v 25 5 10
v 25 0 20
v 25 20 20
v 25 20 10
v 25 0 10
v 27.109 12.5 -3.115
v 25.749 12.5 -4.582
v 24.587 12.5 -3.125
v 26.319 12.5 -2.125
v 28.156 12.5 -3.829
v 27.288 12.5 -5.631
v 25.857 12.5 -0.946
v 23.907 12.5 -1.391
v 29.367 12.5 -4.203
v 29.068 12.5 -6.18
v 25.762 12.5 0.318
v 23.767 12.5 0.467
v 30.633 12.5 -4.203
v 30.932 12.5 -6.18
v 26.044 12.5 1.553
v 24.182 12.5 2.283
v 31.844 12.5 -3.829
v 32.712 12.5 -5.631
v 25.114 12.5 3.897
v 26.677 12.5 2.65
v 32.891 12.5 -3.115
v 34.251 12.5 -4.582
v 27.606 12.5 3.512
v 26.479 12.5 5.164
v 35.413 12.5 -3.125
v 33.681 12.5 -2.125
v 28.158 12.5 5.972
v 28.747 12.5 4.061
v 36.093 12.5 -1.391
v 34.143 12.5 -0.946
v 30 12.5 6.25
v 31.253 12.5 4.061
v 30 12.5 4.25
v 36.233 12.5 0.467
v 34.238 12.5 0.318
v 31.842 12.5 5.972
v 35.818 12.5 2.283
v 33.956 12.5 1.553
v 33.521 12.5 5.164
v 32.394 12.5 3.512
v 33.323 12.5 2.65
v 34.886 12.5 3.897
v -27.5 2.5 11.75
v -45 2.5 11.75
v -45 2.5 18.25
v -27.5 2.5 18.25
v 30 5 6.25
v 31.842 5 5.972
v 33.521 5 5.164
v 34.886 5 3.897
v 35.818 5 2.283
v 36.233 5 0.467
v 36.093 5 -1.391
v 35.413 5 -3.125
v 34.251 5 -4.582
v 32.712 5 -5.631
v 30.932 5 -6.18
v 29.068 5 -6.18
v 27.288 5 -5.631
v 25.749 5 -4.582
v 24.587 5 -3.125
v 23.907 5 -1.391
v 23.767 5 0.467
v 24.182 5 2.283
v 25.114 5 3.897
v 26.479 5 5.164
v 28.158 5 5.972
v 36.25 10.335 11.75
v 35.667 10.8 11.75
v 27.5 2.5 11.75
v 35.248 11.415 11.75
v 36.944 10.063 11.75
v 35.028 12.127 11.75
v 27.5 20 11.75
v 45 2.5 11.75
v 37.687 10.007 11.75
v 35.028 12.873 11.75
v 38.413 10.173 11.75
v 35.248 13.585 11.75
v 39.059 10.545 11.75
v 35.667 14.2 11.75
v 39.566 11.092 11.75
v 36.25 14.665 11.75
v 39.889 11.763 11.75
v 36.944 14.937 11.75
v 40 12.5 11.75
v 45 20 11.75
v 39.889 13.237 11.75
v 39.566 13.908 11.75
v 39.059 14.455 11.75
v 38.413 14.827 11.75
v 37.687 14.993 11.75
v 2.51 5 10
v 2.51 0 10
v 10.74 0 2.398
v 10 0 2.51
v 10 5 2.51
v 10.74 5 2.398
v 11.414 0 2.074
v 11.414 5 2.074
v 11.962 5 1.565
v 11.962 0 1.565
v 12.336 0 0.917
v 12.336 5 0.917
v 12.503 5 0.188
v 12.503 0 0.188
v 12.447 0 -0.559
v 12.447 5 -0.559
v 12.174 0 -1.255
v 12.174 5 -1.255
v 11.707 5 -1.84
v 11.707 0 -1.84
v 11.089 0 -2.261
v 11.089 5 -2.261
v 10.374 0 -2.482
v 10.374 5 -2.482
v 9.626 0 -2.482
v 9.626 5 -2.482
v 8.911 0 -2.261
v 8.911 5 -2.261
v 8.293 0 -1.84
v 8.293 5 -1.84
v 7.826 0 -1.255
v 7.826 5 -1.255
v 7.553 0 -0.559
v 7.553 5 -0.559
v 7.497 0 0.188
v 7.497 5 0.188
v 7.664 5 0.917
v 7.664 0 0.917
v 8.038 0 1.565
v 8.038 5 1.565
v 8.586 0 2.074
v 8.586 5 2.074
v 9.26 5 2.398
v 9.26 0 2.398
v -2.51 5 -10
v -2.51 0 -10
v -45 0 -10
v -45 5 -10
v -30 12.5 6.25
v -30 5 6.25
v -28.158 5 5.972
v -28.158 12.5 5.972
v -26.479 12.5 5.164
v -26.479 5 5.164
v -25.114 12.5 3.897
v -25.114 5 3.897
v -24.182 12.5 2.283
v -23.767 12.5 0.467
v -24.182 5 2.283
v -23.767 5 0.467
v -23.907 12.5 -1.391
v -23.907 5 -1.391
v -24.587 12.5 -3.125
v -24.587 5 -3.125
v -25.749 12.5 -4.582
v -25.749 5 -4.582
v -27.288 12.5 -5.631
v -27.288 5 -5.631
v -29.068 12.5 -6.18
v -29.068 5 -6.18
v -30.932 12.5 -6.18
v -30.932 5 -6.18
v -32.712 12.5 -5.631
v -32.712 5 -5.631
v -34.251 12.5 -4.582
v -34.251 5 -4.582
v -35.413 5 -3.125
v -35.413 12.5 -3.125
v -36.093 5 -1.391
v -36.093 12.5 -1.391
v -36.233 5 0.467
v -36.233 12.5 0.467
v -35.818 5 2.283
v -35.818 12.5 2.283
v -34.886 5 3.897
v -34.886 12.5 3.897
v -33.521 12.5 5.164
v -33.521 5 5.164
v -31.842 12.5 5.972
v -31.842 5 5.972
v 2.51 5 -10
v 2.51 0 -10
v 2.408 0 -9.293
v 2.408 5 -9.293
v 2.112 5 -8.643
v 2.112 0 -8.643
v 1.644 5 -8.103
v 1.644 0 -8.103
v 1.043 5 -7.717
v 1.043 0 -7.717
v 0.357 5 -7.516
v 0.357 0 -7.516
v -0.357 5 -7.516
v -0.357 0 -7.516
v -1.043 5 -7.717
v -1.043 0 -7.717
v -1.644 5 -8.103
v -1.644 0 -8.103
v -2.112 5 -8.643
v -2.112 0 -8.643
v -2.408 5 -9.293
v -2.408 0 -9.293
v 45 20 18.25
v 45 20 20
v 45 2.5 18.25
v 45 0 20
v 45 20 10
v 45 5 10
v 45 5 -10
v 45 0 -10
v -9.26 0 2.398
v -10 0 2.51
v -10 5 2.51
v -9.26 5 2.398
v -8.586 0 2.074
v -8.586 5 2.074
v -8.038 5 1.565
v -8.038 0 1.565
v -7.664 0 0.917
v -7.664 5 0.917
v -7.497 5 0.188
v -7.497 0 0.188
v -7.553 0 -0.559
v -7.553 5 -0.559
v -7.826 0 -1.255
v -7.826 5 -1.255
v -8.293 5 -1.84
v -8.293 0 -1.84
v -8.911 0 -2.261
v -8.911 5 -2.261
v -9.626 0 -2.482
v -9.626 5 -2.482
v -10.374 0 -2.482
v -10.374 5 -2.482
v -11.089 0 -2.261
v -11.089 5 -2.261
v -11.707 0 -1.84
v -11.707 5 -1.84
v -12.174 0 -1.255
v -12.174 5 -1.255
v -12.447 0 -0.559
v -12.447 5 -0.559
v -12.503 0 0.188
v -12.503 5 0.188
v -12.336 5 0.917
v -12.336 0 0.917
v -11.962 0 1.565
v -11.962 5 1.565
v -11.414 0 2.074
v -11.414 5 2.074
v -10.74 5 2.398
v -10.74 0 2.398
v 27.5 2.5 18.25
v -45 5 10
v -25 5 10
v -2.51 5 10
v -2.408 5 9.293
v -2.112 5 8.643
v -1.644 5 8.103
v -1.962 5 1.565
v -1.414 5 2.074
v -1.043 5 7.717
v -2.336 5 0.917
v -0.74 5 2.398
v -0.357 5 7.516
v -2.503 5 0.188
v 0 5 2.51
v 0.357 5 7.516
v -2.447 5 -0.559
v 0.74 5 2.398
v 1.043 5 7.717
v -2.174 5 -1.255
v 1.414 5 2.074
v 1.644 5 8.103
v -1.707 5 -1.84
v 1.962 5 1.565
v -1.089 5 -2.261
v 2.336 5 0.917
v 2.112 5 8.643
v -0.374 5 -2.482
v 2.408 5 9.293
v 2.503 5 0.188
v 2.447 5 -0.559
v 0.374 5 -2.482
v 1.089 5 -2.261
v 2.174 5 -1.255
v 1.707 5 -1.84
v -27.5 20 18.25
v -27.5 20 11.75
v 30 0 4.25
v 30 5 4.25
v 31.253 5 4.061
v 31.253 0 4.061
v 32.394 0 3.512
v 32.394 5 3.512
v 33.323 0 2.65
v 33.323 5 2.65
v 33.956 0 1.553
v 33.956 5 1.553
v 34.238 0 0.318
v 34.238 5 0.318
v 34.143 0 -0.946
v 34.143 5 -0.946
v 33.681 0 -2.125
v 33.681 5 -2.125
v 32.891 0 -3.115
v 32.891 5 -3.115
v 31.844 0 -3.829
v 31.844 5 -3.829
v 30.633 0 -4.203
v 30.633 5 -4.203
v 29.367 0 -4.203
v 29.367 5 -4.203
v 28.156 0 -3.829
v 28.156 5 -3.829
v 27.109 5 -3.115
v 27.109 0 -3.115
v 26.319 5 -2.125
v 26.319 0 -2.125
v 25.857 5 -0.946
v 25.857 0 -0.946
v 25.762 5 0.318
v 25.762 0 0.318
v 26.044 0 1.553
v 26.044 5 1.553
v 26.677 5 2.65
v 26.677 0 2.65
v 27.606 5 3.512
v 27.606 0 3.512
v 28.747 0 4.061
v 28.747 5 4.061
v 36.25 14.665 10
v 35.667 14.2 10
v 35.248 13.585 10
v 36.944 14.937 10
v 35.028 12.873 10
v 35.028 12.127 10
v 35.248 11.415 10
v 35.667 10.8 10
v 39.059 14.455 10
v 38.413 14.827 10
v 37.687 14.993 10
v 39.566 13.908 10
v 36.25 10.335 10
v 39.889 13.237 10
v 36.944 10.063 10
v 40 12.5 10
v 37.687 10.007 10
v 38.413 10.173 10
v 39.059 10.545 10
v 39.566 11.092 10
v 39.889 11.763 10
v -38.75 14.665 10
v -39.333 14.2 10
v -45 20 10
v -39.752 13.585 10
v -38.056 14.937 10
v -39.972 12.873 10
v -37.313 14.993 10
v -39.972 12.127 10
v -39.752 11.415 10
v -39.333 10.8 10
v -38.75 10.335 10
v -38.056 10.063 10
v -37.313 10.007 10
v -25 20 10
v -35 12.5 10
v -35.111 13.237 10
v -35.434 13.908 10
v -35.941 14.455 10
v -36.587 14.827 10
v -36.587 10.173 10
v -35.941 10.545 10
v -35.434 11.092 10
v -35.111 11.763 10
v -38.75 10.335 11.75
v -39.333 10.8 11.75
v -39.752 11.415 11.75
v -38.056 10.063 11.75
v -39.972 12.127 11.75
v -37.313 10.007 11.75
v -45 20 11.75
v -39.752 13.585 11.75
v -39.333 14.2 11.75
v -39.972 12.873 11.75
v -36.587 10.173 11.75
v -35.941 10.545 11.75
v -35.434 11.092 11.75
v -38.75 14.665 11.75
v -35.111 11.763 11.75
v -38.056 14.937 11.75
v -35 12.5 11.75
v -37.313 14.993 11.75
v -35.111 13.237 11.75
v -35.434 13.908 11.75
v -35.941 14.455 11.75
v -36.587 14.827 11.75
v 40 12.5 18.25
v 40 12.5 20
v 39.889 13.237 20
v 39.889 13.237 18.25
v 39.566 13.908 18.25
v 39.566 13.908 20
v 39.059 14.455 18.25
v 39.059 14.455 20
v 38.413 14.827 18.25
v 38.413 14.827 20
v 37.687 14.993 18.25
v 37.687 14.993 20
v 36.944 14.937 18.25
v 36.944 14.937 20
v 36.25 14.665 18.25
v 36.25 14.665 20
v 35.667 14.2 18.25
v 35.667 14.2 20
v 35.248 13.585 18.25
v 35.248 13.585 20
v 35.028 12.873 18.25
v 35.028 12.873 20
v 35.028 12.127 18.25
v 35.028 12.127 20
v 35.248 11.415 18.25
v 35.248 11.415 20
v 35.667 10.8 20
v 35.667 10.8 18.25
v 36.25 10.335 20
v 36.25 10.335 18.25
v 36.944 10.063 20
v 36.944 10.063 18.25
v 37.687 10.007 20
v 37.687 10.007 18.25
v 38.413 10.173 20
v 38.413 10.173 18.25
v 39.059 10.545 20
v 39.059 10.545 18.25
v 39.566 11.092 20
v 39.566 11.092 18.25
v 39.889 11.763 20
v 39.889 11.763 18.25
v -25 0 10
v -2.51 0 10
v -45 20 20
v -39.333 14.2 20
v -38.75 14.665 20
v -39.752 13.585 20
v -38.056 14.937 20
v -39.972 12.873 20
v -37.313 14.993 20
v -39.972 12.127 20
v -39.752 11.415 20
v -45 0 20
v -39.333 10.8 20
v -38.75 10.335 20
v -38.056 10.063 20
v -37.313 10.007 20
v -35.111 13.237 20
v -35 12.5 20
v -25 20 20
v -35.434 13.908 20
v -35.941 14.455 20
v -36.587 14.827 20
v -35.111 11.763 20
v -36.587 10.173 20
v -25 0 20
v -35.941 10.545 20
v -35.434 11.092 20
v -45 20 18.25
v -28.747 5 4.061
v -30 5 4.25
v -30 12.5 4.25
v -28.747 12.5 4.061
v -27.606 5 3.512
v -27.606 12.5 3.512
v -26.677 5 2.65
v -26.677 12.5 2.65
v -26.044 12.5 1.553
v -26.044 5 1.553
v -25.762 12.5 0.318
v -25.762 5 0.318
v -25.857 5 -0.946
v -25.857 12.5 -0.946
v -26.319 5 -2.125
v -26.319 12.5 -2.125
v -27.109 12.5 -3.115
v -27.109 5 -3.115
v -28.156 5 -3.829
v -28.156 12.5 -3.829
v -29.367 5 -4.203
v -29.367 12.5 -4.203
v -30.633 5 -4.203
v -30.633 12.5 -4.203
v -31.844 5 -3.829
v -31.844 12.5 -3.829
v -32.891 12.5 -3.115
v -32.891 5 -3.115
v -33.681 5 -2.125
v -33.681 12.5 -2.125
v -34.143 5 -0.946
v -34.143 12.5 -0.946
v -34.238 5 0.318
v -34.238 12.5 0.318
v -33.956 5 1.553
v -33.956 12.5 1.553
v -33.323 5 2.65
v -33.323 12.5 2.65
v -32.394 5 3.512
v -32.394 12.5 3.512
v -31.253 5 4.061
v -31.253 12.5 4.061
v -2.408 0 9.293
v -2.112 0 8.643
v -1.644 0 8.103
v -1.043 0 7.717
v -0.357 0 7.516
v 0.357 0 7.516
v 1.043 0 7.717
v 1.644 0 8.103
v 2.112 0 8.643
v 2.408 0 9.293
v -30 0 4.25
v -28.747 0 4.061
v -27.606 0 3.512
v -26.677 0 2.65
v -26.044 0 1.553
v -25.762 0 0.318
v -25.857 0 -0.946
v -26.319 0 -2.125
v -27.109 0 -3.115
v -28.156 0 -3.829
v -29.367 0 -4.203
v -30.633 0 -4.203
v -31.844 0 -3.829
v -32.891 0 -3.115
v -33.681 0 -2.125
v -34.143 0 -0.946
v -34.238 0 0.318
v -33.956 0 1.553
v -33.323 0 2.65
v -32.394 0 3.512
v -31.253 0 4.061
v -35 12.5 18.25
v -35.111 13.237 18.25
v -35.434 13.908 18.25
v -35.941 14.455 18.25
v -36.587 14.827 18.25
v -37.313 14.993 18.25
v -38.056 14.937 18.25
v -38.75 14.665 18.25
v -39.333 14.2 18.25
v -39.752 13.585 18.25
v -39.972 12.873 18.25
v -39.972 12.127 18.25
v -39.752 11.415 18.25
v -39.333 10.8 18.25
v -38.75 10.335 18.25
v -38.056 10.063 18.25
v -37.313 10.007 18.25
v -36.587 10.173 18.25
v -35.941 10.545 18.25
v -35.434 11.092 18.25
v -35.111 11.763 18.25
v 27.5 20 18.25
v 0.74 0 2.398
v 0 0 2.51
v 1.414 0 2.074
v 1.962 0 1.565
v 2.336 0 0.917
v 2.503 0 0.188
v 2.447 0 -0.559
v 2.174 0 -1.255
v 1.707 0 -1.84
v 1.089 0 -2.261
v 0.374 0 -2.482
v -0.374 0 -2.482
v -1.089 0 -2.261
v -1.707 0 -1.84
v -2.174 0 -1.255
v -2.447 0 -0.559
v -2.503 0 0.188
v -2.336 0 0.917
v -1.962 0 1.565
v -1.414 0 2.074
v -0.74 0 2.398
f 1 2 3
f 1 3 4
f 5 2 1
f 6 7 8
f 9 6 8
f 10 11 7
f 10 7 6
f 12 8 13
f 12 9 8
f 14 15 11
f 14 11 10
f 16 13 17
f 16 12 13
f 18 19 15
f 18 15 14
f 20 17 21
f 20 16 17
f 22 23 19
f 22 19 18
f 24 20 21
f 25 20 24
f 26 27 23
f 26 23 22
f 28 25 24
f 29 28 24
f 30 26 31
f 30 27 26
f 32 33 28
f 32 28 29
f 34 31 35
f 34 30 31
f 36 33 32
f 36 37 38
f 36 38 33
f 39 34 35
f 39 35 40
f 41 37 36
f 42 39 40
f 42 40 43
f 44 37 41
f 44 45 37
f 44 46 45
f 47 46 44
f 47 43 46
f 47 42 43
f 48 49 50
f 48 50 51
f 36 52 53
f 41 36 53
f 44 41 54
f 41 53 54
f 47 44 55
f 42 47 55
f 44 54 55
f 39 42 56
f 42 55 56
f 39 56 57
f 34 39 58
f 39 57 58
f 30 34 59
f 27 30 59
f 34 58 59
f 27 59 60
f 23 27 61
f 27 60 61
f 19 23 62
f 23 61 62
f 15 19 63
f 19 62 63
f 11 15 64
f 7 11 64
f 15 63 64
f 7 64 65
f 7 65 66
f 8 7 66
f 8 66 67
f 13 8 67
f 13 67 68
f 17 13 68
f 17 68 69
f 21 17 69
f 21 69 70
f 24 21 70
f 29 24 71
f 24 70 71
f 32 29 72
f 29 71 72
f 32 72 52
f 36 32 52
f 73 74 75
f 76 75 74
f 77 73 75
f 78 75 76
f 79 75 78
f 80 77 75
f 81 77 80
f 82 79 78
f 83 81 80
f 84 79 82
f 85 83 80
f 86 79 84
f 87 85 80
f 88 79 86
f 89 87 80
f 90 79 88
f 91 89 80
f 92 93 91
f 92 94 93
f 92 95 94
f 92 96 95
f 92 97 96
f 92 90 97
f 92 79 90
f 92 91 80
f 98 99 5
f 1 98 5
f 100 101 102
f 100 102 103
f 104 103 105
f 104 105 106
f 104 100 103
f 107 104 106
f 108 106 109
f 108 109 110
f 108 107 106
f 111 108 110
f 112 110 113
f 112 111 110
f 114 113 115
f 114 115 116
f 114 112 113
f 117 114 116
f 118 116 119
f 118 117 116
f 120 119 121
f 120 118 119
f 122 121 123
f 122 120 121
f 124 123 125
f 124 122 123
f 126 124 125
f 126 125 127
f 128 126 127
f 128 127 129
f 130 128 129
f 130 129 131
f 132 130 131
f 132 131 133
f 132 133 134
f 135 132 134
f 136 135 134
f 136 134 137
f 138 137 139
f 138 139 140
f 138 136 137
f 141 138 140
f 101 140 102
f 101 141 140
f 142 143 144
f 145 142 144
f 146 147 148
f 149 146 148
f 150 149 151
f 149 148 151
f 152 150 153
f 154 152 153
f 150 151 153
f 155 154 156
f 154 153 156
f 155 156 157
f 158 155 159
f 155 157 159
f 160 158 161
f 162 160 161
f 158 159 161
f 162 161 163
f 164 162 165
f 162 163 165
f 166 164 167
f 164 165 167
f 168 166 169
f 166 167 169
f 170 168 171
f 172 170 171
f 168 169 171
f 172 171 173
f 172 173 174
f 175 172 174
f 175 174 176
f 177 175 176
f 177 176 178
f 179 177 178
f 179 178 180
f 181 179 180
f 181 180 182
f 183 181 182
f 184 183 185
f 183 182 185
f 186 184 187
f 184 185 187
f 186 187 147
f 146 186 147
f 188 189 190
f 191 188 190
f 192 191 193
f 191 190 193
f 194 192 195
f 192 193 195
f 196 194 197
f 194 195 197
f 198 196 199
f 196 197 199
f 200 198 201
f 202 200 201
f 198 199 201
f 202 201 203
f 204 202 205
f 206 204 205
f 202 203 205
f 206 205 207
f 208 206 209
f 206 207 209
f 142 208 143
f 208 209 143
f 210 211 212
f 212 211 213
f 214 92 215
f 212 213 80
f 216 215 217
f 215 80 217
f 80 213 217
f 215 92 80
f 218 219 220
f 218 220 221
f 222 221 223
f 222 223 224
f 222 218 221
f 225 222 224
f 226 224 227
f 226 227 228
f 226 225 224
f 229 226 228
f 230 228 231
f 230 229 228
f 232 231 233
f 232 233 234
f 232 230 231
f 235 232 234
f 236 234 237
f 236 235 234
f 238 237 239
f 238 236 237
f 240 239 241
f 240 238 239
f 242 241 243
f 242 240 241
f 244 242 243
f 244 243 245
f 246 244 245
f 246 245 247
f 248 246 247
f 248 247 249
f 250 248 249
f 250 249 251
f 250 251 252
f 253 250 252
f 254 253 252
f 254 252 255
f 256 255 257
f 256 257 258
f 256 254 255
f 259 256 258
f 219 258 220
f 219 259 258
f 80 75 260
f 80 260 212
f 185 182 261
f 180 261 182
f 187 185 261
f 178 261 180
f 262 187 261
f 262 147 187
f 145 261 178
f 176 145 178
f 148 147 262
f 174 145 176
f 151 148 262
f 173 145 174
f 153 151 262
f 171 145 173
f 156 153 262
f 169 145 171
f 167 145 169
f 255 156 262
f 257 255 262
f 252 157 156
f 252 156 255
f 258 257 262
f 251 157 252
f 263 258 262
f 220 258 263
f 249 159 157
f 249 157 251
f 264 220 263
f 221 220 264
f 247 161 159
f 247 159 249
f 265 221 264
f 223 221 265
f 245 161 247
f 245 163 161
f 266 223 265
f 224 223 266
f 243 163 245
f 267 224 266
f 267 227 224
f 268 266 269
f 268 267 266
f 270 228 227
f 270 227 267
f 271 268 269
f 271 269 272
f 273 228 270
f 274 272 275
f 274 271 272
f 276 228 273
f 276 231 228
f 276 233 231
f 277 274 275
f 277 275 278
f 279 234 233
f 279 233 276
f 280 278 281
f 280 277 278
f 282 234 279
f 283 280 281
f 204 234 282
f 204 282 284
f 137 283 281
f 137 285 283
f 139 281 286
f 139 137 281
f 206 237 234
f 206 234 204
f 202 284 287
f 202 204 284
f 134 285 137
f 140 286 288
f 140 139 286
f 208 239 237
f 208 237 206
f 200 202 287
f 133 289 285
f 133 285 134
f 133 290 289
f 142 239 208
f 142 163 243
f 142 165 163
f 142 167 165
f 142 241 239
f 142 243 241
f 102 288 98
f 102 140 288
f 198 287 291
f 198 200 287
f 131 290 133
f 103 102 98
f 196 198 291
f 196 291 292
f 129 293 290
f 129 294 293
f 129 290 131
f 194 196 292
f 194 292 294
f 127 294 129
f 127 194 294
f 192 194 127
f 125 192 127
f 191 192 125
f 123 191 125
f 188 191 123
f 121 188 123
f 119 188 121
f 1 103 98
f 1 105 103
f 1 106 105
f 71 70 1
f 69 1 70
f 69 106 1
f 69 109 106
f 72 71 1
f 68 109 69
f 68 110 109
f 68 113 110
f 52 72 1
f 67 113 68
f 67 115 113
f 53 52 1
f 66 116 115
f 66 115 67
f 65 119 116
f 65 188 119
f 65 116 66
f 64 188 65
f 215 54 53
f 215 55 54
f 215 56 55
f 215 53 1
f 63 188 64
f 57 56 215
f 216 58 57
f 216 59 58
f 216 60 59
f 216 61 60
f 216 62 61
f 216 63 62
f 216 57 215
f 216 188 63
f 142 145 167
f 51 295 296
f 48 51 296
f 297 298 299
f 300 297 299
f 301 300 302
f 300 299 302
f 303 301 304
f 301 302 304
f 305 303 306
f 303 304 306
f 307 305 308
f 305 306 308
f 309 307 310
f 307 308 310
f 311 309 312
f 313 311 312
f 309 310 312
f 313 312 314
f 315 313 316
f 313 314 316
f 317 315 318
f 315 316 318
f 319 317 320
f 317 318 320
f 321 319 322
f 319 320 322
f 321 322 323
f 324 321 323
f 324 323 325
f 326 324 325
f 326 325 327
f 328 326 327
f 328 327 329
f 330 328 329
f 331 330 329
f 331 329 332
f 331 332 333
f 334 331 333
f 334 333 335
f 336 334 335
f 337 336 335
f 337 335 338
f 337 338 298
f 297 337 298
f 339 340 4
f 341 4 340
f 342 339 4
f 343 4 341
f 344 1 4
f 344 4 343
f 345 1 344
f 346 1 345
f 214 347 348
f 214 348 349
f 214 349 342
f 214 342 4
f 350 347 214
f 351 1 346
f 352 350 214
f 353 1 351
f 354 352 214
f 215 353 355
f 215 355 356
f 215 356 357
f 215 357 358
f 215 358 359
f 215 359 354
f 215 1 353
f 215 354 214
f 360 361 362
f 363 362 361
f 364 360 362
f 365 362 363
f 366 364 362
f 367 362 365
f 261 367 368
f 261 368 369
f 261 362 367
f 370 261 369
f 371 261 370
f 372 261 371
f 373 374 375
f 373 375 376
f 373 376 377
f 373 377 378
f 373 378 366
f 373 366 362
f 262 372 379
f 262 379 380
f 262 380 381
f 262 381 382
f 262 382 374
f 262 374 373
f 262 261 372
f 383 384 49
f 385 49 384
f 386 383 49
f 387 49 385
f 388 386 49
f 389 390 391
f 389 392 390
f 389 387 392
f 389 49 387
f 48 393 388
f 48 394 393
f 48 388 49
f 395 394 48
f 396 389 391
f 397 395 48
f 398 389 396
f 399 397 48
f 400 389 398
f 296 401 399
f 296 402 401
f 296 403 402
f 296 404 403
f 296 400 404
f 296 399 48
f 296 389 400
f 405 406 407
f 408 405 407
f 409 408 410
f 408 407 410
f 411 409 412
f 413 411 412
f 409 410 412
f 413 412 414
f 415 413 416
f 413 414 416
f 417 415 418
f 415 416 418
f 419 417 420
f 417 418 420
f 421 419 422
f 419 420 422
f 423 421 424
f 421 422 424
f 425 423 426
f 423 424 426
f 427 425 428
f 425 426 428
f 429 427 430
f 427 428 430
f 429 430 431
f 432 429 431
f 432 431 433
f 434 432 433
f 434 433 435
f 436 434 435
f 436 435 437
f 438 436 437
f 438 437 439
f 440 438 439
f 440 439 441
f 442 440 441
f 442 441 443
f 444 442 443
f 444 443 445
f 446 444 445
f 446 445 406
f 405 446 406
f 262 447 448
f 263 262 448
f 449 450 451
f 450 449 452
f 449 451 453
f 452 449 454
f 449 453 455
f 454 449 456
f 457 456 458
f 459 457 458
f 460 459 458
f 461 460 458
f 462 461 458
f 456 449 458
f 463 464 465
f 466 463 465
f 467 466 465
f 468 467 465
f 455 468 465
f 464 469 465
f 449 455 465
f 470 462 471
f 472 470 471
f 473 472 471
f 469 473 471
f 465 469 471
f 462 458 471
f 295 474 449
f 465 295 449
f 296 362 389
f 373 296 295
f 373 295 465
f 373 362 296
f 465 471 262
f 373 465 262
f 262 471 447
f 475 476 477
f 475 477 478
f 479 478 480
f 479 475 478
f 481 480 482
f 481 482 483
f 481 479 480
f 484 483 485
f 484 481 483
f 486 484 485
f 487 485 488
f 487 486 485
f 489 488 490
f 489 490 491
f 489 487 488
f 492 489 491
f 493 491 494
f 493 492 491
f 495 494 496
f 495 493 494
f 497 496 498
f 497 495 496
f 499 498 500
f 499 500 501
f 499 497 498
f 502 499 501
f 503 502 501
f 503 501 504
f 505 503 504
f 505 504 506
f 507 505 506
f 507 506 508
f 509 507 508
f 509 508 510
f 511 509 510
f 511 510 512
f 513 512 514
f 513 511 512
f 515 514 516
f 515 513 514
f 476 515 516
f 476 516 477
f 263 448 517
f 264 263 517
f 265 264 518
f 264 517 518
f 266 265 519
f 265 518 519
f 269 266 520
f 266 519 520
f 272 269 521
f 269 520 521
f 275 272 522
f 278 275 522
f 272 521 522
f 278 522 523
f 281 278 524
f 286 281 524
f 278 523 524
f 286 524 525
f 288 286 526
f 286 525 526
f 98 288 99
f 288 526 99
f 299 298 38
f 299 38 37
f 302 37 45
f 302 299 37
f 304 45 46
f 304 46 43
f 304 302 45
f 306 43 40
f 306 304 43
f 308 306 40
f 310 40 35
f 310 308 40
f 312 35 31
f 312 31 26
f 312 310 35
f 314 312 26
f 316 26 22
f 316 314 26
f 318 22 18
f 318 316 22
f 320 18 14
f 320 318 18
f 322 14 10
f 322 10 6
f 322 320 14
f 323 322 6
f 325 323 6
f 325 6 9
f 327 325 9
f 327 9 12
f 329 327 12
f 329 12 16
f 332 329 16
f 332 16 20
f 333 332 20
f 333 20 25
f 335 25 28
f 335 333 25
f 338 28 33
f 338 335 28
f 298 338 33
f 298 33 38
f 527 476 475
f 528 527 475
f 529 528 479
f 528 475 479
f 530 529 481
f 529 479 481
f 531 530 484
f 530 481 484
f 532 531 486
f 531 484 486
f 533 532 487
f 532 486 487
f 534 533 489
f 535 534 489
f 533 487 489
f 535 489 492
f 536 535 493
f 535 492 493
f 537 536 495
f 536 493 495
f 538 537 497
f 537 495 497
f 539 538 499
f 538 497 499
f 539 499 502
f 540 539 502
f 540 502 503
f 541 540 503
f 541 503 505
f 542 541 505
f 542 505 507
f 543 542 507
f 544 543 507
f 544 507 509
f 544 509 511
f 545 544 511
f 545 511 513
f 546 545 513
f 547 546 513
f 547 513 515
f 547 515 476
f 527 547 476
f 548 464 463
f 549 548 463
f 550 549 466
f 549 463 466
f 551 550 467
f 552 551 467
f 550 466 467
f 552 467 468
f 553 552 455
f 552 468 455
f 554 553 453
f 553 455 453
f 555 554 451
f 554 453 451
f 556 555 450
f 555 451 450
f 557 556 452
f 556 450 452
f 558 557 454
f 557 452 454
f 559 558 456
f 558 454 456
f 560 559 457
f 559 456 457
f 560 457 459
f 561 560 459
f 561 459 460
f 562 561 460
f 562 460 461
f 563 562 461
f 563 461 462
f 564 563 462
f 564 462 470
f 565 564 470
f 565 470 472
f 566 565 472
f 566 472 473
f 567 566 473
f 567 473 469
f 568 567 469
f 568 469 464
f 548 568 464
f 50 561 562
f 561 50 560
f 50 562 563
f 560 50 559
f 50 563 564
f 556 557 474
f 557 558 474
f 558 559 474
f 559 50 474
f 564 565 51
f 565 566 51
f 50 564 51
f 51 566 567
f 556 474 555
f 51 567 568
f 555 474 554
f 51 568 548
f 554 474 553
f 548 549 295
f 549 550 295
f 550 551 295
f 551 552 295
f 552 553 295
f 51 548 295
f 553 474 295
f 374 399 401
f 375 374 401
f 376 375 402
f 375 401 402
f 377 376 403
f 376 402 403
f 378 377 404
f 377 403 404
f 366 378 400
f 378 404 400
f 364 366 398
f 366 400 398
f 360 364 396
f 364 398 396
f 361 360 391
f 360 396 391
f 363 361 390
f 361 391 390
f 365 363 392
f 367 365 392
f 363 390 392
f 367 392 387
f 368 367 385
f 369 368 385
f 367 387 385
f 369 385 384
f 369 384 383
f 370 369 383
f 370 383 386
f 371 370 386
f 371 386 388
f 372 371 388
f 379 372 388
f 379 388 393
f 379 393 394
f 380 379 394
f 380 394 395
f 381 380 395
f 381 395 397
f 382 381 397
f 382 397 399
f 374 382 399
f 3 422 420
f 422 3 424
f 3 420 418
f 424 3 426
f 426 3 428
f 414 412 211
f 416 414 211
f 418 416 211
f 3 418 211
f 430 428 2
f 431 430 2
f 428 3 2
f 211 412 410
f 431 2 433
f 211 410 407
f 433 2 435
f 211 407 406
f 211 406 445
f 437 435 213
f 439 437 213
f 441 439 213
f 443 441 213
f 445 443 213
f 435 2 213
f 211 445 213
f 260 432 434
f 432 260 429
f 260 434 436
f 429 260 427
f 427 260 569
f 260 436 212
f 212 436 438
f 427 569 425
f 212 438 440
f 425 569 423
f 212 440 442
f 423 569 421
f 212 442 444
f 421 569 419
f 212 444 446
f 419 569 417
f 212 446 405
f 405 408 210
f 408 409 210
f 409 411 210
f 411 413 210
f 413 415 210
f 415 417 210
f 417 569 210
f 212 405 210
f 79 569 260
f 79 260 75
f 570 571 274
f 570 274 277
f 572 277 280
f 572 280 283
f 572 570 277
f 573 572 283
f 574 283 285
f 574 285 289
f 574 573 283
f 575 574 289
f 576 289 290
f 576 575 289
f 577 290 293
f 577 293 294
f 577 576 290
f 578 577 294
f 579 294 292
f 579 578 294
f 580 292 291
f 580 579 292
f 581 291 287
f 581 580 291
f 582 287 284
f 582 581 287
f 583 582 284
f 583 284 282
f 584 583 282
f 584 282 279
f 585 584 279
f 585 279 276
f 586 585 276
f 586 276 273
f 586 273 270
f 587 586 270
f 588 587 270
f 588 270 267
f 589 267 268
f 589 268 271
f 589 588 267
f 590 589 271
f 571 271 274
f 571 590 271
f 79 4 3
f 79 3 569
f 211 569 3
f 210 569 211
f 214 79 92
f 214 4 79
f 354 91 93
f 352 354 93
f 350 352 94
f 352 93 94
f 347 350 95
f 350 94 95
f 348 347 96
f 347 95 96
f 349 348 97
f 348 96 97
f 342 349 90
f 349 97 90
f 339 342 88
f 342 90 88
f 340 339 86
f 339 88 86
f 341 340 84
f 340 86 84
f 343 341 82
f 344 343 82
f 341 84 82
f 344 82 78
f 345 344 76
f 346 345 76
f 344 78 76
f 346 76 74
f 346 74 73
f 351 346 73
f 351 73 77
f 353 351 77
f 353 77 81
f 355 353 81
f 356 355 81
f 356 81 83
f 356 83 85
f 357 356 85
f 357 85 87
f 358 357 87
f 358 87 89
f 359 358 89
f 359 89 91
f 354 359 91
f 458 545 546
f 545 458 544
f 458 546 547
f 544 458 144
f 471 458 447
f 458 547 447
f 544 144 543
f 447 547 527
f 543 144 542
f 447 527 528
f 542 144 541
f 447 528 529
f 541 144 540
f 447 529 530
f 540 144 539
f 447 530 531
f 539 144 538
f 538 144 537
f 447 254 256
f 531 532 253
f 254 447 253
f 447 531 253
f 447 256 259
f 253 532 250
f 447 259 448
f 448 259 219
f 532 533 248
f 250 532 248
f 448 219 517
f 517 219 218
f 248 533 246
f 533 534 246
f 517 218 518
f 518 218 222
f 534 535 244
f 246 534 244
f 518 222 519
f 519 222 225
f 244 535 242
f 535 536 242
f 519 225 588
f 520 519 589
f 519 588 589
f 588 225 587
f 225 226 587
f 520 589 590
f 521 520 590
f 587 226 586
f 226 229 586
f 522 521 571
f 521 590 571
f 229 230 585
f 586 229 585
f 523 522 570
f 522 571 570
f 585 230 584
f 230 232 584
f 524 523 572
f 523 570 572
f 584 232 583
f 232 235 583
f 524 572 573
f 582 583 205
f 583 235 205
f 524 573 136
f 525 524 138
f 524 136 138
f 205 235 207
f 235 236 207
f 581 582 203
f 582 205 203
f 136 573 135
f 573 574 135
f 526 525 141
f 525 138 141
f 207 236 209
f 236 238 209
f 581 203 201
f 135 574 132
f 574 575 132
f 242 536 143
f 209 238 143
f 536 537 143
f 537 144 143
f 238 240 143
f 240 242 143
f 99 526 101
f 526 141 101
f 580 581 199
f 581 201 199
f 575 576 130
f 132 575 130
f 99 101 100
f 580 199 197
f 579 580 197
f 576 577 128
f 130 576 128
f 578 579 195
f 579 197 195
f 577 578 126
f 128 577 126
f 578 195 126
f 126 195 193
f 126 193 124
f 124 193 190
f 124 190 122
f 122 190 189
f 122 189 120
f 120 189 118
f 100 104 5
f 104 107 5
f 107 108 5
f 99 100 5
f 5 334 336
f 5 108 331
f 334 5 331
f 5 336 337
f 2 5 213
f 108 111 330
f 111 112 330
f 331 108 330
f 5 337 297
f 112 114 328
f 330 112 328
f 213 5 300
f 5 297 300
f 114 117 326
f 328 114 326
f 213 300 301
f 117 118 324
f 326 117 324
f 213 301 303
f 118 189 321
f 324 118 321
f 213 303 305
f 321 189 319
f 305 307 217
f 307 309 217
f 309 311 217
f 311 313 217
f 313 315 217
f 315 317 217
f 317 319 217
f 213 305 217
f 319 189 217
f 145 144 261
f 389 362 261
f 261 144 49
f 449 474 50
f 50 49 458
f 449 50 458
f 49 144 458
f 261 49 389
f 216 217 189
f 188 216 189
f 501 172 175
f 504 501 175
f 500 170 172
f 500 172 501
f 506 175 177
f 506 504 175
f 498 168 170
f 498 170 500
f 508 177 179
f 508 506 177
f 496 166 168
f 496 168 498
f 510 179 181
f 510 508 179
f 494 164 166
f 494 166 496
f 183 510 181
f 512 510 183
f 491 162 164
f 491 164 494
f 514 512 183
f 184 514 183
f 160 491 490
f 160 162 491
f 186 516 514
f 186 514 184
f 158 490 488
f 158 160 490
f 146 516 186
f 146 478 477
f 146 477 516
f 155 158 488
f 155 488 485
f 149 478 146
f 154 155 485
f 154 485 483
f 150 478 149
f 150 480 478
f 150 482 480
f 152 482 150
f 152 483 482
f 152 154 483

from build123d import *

# Parameters (mm, degrees)
SKETCH1_R           = 2.51
BOSS_EXTRUDE1_DEPTH = 5
SKETCH2_R           = 6.25
SKETCH2_R_2         = 4.25
BOSS_EXTRUDE2_DEPTH = 7.5
SKETCH2_3_R         = 4.25
CUT_EXTRUDE1_DEPTH  = 47.703854396
SKETCH1_3_W         = 20
SKETCH1_3_H         = 10
BOSS_EXTRUDE3_DEPTH = 20
SKETCH3_W           = 17.5
SKETCH3_H           = 6.5
CUT_EXTRUDE2_DEPTH  = 17.5
CUT_EXTRUDE3_REACH  = 59.663
SKETCH4_R           = 2.5


with BuildPart() as part:
    # Sketch1 → Boss-Extrude1 (new body)
    with BuildSketch(Plane(origin=(0, 0, 0), x_dir=(1, 0, 0), z_dir=(0, 1, 0))):
        with BuildLine():
            Line((2.51, -9.999999226), (45, -9.999999226))
            Line((45, -9.999999226), (45, 10.000000774))
            Line((45, 10.000000774), (2.51, 10.000000774))
            ThreePointArc((2.51, 10.000000774), (0, 7.490000774), (-2.51, 10.000000774))
            Line((-2.51, 10.000000774), (-45, 10.000000774))
            Line((-45, 10.000000774), (-45, -9.999999226))
            Line((-45, -9.999999226), (-2.51, -9.999999226))
            ThreePointArc((-2.51, -9.999999226), (0, -7.489999226), (2.51, -9.999999226))
        make_face()
        with Locations(Location((-10, 7.74e-07, 0), (0, 0, 270))):
            Circle(SKETCH1_R, mode=Mode.SUBTRACT)
        with Locations(Location((0, 7.74e-07, 0), (0, 0, 270))):
            Circle(SKETCH1_R, mode=Mode.SUBTRACT)
        with Locations(Location((10, 7.74e-07, 0), (0, 0, 270))):
            Circle(SKETCH1_R, mode=Mode.SUBTRACT)
    extrude(amount=BOSS_EXTRUDE1_DEPTH)

    # Sketch2 → Boss-Extrude2 (add)
    # profile 1 of 2: a face of its own
    with BuildSketch(Plane(origin=(0, 5, 0), x_dir=(1, 0, 0), z_dir=(0, 1, 0))):
        with Locations(Location((-30, 0, 0), (0, 0, 270))):
            Circle(SKETCH2_R)
        with Locations(Location((-30, 0, 0), (0, 0, 270))):
            Circle(SKETCH2_R_2, mode=Mode.SUBTRACT)
    # profile 2 of 2: a face of its own
    with BuildSketch(Plane(origin=(0, 5, 0), x_dir=(1, 0, 0), z_dir=(0, 1, 0))):
        with Locations(Location((30, 0, 0), (0, 0, 270))):
            Circle(SKETCH2_R)
        with Locations(Location((30, 0, 0), (0, 0, 270))):
            Circle(SKETCH2_R_2, mode=Mode.SUBTRACT)
    extrude(amount=BOSS_EXTRUDE2_DEPTH)

    # Sketch2<3> → Cut-Extrude1 (cut, through all)
    with BuildSketch(Plane(origin=(0, 5, 0), x_dir=(1, 0, 0), z_dir=(0, 1, 0))):
        with Locations(Location((-30, 0, 0), (0, 0, 270))):
            Circle(SKETCH2_3_R)
        with Locations(Location((30, 0, 0), (0, 0, 270))):
            Circle(SKETCH2_3_R)
    extrude(amount=-CUT_EXTRUDE1_DEPTH, mode=Mode.SUBTRACT)

    # Sketch1<3> → Boss-Extrude3 (add)
    with BuildSketch(Plane(origin=(0, 0, 0), x_dir=(1, 0, 0), z_dir=(0, 1, 0))):
        with Locations((35, -14.999999226)):
            Rectangle(SKETCH1_3_W, SKETCH1_3_H)
        with Locations((-35, -14.999999226)):
            Rectangle(SKETCH1_3_W, SKETCH1_3_H)
    extrude(amount=BOSS_EXTRUDE3_DEPTH)

    # Sketch3 → Cut-Extrude2 (cut)
    with BuildSketch(Plane(origin=(0, 20, 0), x_dir=(1, 0, 0), z_dir=(0, 1, 0))):
        with Locations((36.25, -14.999999226)):
            Rectangle(SKETCH3_W, SKETCH3_H)
        with Locations((-36.25, -14.999999226)):
            Rectangle(SKETCH3_W, SKETCH3_H)
    extrude(amount=-CUT_EXTRUDE2_DEPTH, mode=Mode.SUBTRACT)

    # Cut-Extrude3: up to this face of the body (flat: up to its plane)
    cut_extrude3_end = Plane(part.part.faces().sort_by_distance((35, 12.5, 9.999999226))[0])
    # Sketch4 → Cut-Extrude3 (cut, up to the picked face)
    with BuildSketch(Plane.XY.offset(19.999999226), mode=Mode.PRIVATE) as cut_extrude3_sk1:
        with Locations((37.5, 12.5)):
            Circle(SKETCH4_R)
    cut_extrude3_tool1 = split(extrude(cut_extrude3_sk1.sketch, amount=-CUT_EXTRUDE3_REACH, mode=Mode.PRIVATE), bisect_by=cut_extrude3_end, keep=Keep.BOTH, mode=Mode.PRIVATE)
    # Sketch4 → Cut-Extrude3 (cut, up to the picked face)
    with BuildSketch(Plane.XY.offset(19.999999226), mode=Mode.PRIVATE) as cut_extrude3_sk2:
        with Locations((-37.5, 12.5)):
            Circle(SKETCH4_R)
    cut_extrude3_tool2 = split(extrude(cut_extrude3_sk2.sketch, amount=-CUT_EXTRUDE3_REACH, mode=Mode.PRIVATE), bisect_by=cut_extrude3_end, keep=Keep.BOTH, mode=Mode.PRIVATE)
    add(cut_extrude3_tool1.solids().sort_by(Axis((37.5, 12.5, 19.999999), (0, 0, -1)))[0], mode=Mode.SUBTRACT)
    add(cut_extrude3_tool2.solids().sort_by(Axis((-37.5, 12.5, 19.999999), (0, 0, -1)))[0], mode=Mode.SUBTRACT)


solid = part.part
